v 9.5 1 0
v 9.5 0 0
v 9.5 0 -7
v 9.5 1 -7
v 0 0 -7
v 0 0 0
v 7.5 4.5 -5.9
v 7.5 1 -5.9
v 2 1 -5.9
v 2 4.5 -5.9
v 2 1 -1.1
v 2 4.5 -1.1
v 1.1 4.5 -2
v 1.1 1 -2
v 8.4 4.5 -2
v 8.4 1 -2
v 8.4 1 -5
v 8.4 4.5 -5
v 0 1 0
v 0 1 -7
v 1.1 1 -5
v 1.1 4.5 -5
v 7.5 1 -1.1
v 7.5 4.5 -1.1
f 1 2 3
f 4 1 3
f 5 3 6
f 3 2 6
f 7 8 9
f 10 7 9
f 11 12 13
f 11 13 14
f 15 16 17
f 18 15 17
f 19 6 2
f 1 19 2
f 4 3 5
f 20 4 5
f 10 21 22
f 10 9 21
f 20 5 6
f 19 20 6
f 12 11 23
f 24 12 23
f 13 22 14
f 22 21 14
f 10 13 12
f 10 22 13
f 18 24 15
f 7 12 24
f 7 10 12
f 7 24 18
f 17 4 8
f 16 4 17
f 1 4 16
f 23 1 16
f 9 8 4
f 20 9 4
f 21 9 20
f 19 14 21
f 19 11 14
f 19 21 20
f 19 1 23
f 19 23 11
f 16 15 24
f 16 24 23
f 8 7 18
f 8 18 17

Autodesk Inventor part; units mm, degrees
ref_plane "YZ Plane" through (0, 0, 0) normal (1, 0, 0) x (0, 1, 0)
ref_plane "XZ Plane" through (0, 0, 0) normal (0, 1, 0) x (-1, 0, 0)
ref_plane "XY Plane" through (0, 0, 0) normal (0, 0, 1) x (1, 0, 0)
sketch "Náčrt1" plane through (0, 0, 0) normal (0, 1, 0) x (-1, 0, 0)
  line L0 (0, 0) -> (-9.5, 0)
  line L1 (-9.5, 0) -> (-9.5, -7)
  line L2 (-9.5, -7) -> (0, -7)
  line L3 (0, -7) -> (0, 0)
  dimension "d0" = 9.5
  dimension "d1" = 7
extrude "Vysunutí1" add sketch "Náčrt1" along normal blind 1
sketch "Náčrt2" plane through (0, 1, 0) normal (0, 1, 0) x (1, 0, 0)
  line L0 (1.1, 1.1) -> (8.4, 1.1)
  line L1 (8.4, 1.1) -> (8.4, 5.9)
  line L2 (8.4, 5.9) -> (1.1, 5.9)
  line L3 (1.1, 5.9) -> (1.1, 1.1)
  line L4 (9.5, 7) -> (0, 7) projected
  line L5 (0, 7) -> (0, 0) projected
  dimension "d4" = 7.3
  dimension "d5" = 4.8
  dimension "d6" = 1.1
  dimension "d7" = 1.1
extrude "Vysunutí2" add sketch "Náčrt2" along normal blind 3.5
chamfer "Zkosení1" distance 0.9 angle 45 4 edges at (1.1, 2.75, -5.9) (1.1, 2.75, -1.1) (8.4, 2.75, -1.1) (8.4, 2.75, -5.9)
sketch "Náčrt3" plane through (0, 0, 0) normal (0, 0, 1) x (1, 0, 0)
  point P0 (0, 0)
sketch "Náčrt4" plane through (0, 1, 0) normal (0, 1, 0) x (1, 0, 0)
  point P0 (0, 0)
properties part number "MiddleButton"
